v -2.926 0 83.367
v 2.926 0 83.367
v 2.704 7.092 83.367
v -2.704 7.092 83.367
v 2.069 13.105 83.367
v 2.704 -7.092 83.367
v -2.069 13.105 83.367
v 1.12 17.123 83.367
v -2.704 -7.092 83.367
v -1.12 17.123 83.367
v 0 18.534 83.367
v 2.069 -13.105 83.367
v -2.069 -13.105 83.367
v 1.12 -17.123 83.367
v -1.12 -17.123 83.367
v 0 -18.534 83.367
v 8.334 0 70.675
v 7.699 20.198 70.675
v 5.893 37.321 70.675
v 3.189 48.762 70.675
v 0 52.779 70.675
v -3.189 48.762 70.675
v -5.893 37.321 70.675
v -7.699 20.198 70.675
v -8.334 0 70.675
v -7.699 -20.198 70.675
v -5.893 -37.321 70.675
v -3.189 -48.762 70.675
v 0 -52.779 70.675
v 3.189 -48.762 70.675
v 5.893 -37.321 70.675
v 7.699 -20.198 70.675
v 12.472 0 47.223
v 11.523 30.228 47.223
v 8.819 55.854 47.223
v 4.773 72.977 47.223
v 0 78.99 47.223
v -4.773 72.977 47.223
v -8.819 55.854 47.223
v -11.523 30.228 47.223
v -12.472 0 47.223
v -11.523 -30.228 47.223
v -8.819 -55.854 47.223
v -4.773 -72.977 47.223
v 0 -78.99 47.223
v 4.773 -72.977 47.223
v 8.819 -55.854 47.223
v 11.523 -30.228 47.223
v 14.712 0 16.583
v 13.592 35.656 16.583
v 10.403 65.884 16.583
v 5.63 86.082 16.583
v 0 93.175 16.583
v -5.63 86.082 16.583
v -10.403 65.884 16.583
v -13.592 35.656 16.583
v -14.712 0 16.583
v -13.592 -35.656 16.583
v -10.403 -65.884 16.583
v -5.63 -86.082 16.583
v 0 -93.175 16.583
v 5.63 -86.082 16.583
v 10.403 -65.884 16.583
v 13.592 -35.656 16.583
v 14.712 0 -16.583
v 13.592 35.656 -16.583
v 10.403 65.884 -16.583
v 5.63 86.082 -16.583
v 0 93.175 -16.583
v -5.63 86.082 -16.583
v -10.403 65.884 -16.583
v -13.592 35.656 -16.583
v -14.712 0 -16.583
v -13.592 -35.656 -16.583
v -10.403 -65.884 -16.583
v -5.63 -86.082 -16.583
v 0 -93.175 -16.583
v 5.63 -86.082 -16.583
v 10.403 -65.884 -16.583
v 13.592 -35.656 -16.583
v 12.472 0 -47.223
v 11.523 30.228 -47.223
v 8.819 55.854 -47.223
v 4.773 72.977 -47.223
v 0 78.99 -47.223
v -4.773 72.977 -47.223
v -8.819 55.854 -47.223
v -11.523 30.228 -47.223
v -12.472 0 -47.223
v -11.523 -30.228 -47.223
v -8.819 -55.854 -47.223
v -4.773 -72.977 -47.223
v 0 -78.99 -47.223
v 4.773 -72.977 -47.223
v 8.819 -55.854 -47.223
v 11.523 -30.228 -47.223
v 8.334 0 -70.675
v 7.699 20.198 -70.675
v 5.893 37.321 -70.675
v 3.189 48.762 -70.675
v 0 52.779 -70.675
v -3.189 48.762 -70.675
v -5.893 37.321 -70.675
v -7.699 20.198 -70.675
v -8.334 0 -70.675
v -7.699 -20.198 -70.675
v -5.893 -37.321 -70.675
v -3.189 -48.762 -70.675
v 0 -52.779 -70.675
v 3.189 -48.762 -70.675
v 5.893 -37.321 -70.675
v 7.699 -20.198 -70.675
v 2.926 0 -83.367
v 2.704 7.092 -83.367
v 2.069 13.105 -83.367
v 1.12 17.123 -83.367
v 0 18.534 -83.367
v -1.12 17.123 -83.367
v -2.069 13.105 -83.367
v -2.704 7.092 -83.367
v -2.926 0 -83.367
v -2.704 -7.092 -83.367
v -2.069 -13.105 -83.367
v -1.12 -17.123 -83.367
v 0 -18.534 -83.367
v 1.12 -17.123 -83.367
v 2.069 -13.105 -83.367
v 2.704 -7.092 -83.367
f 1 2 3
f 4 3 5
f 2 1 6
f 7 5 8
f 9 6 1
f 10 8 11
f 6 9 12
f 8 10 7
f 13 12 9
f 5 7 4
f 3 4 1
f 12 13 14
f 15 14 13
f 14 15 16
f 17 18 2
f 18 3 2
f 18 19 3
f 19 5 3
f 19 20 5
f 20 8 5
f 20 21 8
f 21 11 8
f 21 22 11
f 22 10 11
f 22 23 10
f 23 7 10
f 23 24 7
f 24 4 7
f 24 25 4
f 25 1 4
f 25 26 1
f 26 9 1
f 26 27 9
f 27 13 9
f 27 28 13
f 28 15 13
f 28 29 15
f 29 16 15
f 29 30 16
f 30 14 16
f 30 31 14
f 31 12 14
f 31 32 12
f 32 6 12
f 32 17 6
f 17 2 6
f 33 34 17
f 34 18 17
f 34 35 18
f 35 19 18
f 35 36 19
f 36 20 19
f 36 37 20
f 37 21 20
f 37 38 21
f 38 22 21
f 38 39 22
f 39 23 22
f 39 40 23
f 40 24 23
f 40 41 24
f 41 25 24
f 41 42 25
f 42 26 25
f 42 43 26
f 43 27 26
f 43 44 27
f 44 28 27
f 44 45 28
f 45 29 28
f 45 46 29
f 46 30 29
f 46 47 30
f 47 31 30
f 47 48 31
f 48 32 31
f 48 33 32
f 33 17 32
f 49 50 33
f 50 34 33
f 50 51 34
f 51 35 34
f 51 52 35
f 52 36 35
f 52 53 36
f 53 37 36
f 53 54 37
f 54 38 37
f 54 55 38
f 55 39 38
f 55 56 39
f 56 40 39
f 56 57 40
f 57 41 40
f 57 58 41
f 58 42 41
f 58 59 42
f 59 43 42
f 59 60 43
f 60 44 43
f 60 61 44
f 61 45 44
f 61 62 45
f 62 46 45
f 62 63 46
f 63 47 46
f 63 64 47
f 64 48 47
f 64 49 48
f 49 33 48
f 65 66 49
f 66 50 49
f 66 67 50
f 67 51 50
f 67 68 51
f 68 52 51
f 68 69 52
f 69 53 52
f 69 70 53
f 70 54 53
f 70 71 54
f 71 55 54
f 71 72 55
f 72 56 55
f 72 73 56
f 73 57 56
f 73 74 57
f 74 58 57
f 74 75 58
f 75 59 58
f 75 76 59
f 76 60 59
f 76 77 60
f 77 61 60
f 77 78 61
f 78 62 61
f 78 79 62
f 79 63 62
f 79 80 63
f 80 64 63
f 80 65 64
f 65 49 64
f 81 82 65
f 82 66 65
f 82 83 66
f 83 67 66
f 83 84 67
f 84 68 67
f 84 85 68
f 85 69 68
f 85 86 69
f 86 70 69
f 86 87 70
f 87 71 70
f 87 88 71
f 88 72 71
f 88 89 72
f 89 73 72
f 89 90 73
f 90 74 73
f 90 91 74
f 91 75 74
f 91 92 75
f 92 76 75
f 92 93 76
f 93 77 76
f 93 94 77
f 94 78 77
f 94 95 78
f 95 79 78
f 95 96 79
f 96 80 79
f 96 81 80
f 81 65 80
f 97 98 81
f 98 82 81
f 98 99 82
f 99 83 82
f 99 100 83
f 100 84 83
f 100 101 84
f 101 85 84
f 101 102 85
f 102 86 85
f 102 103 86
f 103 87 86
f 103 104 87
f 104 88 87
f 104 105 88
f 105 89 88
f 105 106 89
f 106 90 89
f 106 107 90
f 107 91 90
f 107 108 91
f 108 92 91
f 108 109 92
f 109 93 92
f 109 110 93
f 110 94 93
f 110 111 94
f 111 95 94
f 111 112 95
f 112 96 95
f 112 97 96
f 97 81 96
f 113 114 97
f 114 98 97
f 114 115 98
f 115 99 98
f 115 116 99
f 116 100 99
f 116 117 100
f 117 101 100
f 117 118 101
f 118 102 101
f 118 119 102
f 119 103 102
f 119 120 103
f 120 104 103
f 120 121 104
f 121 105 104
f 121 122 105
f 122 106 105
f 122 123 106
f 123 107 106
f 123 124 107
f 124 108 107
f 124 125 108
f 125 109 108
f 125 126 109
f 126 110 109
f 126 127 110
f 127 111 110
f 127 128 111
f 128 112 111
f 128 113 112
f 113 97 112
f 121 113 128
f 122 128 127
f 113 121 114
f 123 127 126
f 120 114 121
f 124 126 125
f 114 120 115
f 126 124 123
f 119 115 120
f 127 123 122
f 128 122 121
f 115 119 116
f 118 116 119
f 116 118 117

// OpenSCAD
// Generated by SolidPython 1.0.1 on 2020-07-29 00:46:46


scale(v = [3, 19, 17]) {
	sphere(r = 5);
}
/***********************************************
*********      SolidPython code:      **********
************************************************
 
# import packages: SolidPython
from solid import *
from solid.utils import *
from itertools import chain, combinations, permutations


class Resize:

    def __init__(self, scad_file):
        self.scad_file = scad_file
        #self.scad_file = import_scad(scad_file)
        # cone/cylinder param:
        self.r1 = 0
        self.r2 = 0
        self.h = 0
        # rectangular prism param:
        self.w = 0
        self.l = 0
        # ellipse param:
        self.r = 0

    # import OpenScad code (file name corresponds to shape)


    # classify shape + parameters
    def assign(self, param1, param2, param3):
        if self.scad_file == 'cone.scad':
            self.r1 = param1
            self.r2 = param2
            self.h = param3
        elif self.scad_file == 'cylinder.scad':
            self.r1 = param1
            self.r2 = param2
            self.h = param3
        elif self.scad_file == 'rectangularPrism.scad':
            self.h = param1
            self.l = param2
            self.w = param3
        else:
            self.r = param1
            self.h = param2

    # resize parameters
    def iterate(self):
        x = range(3, 20, 2)
        i = 1
        if self.scad_file == 'cone.scad':
            tempList = list(permutations(x, 2))
            for temp in tempList:
                param1 = temp[0]
                param2 = temp[1]
                filepath = 'produced_scad_files/' + 'cone' + str(param1) + '_' + str(param2) + '_' + '.scad'
                scad_render_to_file(cylinder(h=param1, r1=param2, r2=0), filepath)

        elif self.scad_file == 'cylinder.scad':
            tempList = list(permutations(x, 3))
            for temp in tempList:
                param1 = temp[0]
                param2 = temp[1]
                filepath = 'produced_scad_files/' + 'cylinder' + str(param1) + '_' + str(param2) + '_' + '.scad'
                scad_render_to_file(cylinder(h=param1, r1=param2, r2=param2), filepath)

        elif self.scad_file == 'rectangularPrism.scad':
            tempList = list(permutations(x, 3))
            for temp in tempList:
                param1 = temp[0]
                param2 = temp[1]
                param3 = temp[2]
                filepath = 'produced_scad_files/' + 'rectangularPrism' + str(param1) + '_' + str(param2) + '_' + str(
                    param3) + '.scad'
                scad_render_to_file(cube(size=(param1, param2, param3)), filepath)

        elif self.scad_file == 'ellipse.scad':
            tempList = list(permutations(x, 4))
            for temp in tempList:
                param1 = temp[0]
                param2 = temp[1]
                param3 = temp[2]
                param4 = temp[3]
                filepath = 'produced_scad_files/' + 'ellipse' + str(param1) + '_' + str(param2) + '_' + str(param3) + '_' + str(param4) + '.scad'
                scad_render_to_file(scale([param1, param2, param3])(sphere(r=param4)), filepath)

    def render_to_scadfile(self):
        scad_render_to_file(scad, 'example.scad') 
 
************************************************/
